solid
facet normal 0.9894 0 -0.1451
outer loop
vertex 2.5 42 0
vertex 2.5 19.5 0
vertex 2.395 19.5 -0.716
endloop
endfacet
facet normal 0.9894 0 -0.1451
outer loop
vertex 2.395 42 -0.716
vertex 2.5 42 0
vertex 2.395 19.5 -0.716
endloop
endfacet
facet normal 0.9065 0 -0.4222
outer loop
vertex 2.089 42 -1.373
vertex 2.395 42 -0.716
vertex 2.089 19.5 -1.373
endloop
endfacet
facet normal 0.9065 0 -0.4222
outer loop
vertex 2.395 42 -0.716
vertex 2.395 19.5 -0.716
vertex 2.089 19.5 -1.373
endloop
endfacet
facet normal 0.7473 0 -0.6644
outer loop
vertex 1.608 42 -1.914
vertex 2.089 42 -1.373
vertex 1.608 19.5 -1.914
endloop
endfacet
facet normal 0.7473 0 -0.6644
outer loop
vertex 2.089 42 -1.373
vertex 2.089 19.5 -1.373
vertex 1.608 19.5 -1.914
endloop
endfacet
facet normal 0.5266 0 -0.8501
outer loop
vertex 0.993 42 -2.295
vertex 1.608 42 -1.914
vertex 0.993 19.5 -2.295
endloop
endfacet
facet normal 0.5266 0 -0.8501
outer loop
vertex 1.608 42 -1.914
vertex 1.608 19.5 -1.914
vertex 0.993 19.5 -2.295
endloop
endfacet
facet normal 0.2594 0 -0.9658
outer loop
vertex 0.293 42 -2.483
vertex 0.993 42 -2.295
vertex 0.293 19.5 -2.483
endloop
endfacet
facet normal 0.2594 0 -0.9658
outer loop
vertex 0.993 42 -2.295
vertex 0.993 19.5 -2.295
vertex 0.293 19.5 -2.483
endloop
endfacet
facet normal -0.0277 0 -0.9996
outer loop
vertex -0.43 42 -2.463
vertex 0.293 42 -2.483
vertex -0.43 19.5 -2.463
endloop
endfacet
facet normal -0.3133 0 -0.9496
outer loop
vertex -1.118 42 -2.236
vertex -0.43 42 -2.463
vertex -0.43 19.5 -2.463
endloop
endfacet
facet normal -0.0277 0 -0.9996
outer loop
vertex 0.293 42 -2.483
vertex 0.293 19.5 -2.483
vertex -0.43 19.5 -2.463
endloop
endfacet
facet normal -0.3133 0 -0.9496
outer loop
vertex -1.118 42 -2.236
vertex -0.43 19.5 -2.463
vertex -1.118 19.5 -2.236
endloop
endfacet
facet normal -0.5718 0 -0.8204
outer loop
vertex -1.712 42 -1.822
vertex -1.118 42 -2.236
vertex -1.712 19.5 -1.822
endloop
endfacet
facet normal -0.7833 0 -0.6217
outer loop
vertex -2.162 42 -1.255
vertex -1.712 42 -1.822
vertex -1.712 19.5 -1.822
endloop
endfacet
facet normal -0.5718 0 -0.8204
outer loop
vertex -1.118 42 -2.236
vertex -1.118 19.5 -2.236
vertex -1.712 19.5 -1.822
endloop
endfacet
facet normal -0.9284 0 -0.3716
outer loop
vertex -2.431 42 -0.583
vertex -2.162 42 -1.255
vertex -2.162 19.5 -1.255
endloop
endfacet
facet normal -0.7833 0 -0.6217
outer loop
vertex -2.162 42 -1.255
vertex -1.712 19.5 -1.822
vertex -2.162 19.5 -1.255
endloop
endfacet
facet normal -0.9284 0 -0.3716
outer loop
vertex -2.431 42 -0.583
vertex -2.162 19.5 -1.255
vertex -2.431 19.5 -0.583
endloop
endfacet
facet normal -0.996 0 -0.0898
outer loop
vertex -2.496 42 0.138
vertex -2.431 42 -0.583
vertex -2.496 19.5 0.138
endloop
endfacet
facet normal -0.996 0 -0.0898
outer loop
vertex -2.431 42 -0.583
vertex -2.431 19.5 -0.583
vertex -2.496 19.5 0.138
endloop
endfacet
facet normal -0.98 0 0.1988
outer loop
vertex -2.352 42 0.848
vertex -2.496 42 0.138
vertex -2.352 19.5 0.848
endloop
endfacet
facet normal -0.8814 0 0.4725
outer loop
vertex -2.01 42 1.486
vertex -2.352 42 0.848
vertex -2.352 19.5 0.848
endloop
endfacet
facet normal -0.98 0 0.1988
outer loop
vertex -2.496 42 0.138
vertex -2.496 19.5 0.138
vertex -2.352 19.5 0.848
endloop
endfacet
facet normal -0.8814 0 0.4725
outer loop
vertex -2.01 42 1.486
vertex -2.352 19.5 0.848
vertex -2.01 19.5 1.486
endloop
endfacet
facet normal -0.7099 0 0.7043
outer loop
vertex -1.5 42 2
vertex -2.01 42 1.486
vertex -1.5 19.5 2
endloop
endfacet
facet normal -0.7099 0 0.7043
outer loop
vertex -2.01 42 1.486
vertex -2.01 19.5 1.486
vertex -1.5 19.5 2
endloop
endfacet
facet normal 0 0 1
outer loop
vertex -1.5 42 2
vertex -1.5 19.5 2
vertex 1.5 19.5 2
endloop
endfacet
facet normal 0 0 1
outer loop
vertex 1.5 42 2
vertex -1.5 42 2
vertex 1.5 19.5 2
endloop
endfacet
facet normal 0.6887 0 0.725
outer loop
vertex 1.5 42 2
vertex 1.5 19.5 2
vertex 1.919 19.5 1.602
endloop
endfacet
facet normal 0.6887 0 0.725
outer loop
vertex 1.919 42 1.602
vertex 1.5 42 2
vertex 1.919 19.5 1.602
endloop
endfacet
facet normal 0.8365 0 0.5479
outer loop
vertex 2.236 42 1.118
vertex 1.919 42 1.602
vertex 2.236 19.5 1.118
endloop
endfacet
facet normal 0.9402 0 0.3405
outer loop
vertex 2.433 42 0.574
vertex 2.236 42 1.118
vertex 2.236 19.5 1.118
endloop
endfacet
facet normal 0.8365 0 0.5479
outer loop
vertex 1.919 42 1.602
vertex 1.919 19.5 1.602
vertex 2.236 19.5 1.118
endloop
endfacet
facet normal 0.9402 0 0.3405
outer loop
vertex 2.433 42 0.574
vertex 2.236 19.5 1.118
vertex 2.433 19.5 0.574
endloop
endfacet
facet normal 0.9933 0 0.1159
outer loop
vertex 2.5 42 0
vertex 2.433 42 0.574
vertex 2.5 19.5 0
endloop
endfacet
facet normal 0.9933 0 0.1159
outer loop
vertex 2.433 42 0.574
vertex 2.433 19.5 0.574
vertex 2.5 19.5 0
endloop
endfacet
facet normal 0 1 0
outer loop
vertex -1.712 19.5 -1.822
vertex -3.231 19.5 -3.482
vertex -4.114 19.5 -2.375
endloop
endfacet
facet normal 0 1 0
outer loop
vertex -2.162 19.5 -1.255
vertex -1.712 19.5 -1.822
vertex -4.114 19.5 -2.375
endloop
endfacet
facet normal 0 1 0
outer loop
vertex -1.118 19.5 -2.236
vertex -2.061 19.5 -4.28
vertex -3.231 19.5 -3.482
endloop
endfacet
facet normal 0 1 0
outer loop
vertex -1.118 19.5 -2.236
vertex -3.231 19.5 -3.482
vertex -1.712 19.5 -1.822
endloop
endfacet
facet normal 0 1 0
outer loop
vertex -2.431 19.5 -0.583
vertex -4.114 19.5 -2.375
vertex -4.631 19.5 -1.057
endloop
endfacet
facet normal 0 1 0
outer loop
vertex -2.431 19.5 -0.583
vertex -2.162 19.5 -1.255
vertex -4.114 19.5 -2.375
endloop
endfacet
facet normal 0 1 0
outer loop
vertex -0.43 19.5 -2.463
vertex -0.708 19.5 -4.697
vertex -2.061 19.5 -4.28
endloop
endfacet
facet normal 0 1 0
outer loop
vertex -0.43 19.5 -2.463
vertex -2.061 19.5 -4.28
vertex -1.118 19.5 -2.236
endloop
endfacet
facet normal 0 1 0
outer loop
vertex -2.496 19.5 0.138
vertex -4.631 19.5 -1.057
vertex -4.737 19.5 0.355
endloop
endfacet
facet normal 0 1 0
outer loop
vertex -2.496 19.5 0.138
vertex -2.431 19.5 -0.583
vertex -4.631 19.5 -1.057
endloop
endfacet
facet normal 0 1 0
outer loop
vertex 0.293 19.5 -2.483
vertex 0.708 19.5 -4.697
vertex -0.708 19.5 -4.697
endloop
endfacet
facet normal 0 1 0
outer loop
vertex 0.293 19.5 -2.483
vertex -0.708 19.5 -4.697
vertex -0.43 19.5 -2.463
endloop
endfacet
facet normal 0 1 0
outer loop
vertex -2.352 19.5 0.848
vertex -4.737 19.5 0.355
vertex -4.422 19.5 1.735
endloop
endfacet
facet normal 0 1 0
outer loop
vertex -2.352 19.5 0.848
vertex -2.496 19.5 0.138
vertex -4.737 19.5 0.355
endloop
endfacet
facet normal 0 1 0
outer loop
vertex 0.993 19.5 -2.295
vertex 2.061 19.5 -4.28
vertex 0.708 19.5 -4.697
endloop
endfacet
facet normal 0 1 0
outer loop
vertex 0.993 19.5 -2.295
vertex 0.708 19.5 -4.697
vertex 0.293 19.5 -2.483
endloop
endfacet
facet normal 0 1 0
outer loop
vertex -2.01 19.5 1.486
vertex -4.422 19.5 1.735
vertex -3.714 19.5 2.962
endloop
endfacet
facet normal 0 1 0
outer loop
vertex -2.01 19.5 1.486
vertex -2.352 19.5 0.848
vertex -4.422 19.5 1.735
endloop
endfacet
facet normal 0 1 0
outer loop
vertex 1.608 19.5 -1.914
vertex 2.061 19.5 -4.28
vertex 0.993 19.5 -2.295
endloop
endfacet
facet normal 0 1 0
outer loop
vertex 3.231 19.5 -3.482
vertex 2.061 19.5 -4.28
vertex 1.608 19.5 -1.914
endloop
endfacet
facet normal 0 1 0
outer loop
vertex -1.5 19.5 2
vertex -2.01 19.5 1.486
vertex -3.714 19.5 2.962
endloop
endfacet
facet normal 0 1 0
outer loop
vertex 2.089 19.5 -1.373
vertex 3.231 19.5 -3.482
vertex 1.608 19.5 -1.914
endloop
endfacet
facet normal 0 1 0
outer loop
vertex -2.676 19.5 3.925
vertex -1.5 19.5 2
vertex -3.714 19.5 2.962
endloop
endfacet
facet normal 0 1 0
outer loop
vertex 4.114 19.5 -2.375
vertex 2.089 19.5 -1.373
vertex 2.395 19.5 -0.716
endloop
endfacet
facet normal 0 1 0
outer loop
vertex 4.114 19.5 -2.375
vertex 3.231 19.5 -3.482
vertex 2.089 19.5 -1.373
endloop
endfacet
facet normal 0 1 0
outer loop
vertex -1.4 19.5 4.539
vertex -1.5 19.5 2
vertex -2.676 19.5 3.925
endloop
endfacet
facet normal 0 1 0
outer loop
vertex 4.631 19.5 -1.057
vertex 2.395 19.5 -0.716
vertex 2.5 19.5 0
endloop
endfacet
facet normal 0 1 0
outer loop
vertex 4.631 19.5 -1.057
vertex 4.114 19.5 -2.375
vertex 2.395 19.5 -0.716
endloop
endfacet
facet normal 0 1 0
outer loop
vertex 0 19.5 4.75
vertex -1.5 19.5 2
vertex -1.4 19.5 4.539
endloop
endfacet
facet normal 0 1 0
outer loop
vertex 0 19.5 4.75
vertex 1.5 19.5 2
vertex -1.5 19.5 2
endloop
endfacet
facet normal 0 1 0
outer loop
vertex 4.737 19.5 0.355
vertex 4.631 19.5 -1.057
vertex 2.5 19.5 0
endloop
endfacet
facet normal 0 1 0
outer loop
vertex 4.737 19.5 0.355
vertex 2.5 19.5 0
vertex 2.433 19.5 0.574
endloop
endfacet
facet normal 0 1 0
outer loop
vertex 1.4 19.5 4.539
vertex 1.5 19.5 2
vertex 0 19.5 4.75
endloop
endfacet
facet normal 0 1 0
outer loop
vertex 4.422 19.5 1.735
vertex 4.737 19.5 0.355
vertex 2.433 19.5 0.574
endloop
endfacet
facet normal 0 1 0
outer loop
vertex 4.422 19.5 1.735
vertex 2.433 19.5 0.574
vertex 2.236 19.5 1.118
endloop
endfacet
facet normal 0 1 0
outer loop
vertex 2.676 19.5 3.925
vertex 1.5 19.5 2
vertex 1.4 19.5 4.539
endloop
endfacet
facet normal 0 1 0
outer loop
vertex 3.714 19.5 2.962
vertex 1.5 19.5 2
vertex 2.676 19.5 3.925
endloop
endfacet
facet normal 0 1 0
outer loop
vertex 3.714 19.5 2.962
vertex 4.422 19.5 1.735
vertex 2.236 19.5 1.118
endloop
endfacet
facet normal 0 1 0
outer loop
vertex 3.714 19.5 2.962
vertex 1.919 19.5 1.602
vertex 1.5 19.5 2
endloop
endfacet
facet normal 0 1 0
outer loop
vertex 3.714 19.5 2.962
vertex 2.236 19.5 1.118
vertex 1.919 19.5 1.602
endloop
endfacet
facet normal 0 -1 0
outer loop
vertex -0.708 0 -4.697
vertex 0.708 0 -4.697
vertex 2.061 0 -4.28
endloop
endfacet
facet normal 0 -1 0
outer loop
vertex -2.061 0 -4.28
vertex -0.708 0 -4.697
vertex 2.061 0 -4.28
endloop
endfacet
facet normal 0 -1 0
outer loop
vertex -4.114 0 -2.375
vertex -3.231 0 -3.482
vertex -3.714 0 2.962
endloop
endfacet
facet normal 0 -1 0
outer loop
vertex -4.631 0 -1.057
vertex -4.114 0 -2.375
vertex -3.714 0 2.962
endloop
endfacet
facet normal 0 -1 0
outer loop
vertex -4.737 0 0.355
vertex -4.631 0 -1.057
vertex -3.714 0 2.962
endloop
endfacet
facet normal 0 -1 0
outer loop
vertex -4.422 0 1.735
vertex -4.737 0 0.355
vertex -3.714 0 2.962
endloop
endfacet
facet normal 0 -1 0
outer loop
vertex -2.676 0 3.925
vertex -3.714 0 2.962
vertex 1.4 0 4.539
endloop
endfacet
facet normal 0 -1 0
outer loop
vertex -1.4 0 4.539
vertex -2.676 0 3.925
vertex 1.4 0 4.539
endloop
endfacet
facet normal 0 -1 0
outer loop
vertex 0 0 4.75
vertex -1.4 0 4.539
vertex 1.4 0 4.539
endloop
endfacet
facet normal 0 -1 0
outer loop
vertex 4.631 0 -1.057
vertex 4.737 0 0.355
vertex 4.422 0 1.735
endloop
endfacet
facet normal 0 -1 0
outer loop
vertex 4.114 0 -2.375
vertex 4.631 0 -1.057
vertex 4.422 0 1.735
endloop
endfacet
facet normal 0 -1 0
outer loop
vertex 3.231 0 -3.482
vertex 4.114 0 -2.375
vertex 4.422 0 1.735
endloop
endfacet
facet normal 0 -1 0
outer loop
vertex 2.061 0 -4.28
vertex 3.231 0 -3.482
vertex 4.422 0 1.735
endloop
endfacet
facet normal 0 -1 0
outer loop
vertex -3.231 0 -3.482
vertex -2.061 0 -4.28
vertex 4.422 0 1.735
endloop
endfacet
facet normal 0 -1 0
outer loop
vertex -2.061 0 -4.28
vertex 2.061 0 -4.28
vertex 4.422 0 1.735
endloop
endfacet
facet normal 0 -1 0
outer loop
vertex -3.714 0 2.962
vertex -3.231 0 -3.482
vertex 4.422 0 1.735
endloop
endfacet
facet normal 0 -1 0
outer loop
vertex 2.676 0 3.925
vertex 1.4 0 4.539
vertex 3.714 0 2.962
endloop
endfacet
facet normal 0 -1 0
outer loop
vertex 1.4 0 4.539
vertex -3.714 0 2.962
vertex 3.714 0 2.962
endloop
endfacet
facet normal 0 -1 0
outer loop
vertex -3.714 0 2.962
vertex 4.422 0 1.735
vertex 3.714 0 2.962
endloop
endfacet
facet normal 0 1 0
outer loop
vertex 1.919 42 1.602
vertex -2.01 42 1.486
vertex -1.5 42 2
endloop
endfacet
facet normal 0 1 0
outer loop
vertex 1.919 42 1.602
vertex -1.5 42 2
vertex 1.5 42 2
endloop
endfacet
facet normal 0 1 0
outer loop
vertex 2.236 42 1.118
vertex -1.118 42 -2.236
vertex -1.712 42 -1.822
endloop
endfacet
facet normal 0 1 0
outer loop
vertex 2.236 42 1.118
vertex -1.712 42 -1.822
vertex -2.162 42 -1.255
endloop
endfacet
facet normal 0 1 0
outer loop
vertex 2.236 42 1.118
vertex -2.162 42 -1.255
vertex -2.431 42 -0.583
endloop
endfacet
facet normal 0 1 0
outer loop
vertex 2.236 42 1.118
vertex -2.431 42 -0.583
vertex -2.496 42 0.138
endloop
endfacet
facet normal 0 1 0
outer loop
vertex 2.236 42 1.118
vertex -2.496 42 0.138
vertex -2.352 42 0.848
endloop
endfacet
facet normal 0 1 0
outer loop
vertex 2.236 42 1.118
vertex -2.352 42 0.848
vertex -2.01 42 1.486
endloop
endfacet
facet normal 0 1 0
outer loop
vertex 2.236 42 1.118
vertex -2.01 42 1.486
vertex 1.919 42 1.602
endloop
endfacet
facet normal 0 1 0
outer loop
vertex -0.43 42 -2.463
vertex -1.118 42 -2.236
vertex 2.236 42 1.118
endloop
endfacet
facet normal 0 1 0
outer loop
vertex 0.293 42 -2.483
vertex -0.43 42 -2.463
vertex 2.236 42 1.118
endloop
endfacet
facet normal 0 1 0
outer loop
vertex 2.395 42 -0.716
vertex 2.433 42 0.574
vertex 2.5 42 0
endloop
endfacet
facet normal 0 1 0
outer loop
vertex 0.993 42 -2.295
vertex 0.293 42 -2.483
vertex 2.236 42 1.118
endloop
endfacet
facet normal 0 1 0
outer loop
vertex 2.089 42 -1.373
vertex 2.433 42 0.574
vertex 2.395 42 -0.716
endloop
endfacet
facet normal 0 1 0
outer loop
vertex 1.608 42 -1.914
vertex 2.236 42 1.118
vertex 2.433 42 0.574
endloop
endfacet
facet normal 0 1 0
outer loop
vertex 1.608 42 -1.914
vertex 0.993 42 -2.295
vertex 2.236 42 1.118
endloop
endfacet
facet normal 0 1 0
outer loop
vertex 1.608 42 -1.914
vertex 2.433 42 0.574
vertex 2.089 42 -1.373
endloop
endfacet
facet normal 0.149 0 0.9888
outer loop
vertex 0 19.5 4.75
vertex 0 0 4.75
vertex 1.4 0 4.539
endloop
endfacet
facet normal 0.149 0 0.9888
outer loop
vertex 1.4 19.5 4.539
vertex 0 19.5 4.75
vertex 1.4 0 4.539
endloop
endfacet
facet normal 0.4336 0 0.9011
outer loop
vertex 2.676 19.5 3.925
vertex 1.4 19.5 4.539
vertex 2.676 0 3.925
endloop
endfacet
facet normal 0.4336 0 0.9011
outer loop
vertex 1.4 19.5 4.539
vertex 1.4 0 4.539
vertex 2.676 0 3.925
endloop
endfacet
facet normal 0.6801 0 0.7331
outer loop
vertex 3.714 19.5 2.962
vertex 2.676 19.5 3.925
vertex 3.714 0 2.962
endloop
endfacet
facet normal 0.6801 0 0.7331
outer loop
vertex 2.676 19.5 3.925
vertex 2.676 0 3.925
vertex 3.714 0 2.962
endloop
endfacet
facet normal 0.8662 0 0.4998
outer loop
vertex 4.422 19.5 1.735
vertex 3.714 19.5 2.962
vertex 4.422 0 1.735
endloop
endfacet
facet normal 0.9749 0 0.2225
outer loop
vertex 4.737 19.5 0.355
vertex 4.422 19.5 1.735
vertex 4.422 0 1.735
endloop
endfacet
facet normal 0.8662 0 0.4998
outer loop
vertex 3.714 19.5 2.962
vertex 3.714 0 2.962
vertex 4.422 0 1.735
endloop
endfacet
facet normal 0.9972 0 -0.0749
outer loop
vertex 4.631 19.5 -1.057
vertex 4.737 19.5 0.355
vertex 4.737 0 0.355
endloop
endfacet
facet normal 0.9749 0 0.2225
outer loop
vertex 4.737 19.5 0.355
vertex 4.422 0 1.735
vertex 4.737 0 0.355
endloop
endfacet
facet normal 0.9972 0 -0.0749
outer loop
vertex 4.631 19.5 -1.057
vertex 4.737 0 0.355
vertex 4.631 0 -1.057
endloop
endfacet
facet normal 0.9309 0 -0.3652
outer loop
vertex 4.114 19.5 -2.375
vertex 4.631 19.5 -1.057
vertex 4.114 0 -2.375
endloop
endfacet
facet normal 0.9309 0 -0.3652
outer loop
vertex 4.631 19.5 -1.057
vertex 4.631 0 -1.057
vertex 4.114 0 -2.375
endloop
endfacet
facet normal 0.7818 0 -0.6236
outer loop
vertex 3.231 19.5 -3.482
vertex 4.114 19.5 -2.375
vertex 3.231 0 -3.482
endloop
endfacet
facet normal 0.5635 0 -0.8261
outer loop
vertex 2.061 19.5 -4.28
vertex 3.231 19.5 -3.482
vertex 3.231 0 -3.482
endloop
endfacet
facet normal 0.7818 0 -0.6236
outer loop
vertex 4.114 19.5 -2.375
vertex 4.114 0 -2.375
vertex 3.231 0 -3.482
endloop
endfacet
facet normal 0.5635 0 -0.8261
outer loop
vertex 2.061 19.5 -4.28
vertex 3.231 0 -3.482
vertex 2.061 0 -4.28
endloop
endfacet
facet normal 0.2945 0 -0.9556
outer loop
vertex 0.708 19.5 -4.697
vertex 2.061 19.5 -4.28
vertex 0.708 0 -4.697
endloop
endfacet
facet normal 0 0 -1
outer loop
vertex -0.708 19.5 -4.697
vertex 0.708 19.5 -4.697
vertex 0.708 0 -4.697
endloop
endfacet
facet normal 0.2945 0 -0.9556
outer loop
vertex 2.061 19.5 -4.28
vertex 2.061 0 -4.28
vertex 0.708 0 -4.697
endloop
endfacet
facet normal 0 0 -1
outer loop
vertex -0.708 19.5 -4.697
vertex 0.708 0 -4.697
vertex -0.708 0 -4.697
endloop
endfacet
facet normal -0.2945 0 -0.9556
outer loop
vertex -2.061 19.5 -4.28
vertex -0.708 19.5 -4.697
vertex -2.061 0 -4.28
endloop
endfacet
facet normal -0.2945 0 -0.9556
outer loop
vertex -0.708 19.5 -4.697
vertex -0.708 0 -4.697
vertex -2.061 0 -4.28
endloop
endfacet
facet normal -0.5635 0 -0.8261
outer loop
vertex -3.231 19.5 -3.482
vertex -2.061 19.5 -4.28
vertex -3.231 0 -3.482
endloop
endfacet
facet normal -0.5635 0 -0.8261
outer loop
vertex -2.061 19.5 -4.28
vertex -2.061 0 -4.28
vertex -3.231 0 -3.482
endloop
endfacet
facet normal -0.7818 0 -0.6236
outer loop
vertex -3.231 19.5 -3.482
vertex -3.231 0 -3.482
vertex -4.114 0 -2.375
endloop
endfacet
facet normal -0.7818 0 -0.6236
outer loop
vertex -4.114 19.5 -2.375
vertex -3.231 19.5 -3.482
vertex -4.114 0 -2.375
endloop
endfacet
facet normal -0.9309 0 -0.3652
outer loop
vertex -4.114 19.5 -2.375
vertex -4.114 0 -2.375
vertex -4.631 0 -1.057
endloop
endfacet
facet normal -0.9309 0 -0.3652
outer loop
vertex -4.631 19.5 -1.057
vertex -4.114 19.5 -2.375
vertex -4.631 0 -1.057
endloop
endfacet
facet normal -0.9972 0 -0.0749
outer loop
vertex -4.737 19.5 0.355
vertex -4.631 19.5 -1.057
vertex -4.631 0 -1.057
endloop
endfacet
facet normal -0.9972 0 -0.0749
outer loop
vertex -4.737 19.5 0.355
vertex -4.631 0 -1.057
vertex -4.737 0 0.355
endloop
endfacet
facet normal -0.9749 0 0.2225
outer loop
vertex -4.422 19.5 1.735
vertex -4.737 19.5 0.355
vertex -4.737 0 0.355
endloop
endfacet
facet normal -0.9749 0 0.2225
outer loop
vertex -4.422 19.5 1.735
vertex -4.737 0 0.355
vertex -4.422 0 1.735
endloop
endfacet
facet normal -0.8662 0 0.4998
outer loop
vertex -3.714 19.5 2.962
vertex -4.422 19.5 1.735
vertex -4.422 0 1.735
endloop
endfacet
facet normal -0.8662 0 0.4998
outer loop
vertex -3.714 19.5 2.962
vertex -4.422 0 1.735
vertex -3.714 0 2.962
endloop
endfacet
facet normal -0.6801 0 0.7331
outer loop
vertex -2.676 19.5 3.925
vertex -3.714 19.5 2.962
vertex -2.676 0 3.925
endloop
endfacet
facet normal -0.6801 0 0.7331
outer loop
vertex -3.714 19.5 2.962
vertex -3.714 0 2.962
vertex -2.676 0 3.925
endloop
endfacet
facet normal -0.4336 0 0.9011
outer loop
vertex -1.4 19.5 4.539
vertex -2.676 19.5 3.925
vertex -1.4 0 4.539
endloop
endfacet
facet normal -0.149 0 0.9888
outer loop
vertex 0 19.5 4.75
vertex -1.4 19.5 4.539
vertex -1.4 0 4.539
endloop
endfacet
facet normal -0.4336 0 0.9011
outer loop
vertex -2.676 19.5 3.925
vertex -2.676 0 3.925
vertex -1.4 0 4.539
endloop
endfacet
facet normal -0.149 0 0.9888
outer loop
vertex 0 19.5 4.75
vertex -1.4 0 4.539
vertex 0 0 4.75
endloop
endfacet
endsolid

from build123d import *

# Parameters (mm, degrees)
SKETCH_1_R      = 4.75
EXTRUDE_1_DEPTH = 19.5
EXTRUDE_2_DEPTH = 22.5


with BuildPart() as part:
    # 草图1 → 凸台-拉伸1 (new body)
    with BuildSketch(Plane(origin=(0, 0, 0), x_dir=(1, 0, 0), z_dir=(0, 1, 0))):
        with Locations(Location((0, 0, 0), (0, 0, 270))):
            Circle(SKETCH_1_R)
    extrude(amount=EXTRUDE_1_DEPTH)

    # 草图2 → 凸台-拉伸2 (add)
    with BuildSketch(Plane(origin=(0, 19.5, 0), x_dir=(1, 0, 0), z_dir=(0, 1, 0))):
        with BuildLine():
            ThreePointArc((2.5, 0), (-1.118033989, 2.236067977), (-1.5, -2))
            Line((-1.5, -2), (1.5, -2))
            ThreePointArc((1.5, -2), (2.236067977, -1.118033989), (2.5, 0))
        make_face()
    extrude(amount=EXTRUDE_2_DEPTH)


solid = part.part
